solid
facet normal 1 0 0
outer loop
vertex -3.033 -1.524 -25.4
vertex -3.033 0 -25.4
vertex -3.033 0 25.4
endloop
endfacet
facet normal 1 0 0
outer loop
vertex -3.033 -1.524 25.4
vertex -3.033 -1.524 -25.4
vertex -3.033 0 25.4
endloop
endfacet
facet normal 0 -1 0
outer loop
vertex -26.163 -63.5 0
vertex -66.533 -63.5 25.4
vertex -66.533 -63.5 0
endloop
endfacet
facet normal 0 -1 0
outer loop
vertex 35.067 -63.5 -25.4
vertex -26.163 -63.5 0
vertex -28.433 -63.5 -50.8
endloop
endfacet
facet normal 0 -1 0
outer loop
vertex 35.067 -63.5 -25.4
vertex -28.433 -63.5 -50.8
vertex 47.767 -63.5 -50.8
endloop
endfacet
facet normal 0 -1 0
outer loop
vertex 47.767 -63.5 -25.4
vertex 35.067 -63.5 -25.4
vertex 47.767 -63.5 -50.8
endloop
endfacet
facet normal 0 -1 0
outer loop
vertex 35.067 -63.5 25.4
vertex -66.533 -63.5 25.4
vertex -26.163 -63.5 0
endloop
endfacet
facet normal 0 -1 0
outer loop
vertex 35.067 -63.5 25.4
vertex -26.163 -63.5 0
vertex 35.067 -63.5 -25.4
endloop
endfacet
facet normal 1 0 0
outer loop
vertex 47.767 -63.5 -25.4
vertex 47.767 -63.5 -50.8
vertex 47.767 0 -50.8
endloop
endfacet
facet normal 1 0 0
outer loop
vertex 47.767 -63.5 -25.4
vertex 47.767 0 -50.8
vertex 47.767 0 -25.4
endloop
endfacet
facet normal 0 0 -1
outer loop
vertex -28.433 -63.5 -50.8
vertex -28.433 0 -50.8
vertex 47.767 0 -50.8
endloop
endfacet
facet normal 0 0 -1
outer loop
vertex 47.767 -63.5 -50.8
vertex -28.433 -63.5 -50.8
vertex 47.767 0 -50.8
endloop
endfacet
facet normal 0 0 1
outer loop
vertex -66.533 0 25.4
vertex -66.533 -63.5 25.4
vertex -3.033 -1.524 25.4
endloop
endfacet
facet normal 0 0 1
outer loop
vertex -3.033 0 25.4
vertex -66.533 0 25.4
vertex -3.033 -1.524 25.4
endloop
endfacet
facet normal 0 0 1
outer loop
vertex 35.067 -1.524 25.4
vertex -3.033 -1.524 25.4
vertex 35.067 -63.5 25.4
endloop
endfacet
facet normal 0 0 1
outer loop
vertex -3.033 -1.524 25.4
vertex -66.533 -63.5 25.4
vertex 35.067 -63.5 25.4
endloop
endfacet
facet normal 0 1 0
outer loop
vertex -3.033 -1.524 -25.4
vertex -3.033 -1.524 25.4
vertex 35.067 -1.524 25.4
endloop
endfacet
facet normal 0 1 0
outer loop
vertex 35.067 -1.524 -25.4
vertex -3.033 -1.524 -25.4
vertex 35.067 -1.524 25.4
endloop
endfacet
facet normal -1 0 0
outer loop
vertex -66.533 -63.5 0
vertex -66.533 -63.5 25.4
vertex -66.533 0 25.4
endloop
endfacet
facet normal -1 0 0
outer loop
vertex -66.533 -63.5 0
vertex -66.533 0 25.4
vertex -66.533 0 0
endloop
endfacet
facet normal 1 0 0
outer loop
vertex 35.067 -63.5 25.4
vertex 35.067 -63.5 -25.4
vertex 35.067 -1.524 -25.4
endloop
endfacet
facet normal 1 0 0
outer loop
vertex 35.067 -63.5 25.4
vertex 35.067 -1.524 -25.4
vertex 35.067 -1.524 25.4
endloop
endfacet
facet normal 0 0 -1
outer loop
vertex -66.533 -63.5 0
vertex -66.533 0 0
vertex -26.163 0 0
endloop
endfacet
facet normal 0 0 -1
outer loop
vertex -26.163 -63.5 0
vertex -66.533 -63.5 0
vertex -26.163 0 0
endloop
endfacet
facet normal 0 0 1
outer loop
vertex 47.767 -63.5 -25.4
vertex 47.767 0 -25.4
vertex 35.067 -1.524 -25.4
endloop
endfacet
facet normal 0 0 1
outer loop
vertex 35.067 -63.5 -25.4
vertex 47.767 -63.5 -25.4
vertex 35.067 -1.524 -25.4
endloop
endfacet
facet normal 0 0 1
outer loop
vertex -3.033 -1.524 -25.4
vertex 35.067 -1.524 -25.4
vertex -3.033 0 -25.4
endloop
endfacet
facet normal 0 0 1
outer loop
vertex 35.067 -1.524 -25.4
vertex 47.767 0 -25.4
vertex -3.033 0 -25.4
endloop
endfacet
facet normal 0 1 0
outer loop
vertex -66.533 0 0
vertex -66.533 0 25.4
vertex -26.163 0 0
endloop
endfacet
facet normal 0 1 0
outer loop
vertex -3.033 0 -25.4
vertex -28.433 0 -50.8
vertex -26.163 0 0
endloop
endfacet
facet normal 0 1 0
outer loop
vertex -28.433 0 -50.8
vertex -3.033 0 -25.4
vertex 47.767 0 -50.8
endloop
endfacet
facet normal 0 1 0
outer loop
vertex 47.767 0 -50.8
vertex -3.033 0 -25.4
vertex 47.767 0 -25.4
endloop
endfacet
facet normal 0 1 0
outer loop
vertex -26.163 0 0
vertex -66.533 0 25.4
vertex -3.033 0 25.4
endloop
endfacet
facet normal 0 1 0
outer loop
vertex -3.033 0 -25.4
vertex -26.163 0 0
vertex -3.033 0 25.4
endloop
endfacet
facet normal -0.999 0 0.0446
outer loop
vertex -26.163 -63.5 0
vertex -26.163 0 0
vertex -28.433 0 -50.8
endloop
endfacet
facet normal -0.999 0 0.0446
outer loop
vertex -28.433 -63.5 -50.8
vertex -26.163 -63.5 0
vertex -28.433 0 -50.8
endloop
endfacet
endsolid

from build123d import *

# Parameters (mm, degrees)
F1_DEPTH = 63.5
F2_W     = 38.1
F2_H     = 50.8
F3_DEPTH = 61.976


with BuildPart() as f1:
    # F0 (on Front) → F1 (new body)
    with BuildSketch(Plane.XZ):
        Polygon((-26.163351, 0), (-28.433141, -50.8), (47.766859, -50.8), (47.766859, -25.4), (-3.033141, -25.4), (-3.033141, 25.4), (-66.533141, 25.4), (-66.533141, 0), (-64.263351, 0), align=None)
    extrude(amount=F1_DEPTH)

    # F2 (on face) → F3 (join)
    with BuildSketch(Plane.XZ.offset(63.5)):
        with Locations((16.016859, 0)):
            Rectangle(F2_W, F2_H)
    extrude(amount=-F3_DEPTH)


solid = f1.part
